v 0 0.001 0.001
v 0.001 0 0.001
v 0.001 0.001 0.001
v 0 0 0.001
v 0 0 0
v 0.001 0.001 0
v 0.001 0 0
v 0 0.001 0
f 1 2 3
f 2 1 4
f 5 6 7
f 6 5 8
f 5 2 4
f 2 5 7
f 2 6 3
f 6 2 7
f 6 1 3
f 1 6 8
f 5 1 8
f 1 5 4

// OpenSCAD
// t_mesh — mesh properties WITHOUT rendering. This is the tier that catches the
// silent-material-loss class; CGAL's "Simple: yes" does not (docs/developer/verification.md).

use <../src/uniTube.scad>;

$fa = 6;
$fs = 0.5;

path = ut_polyline([[0, 0, 0], [50, 0, 0], [50, 50, 0]], r=15);
prof = ut_round(od=12, wall=2);
N = len(ut_prof_outer(prof));

// Analytic expectation: the swept area is the annulus between two N-gons, and
// the developed length is exact. Faceting the arc makes the mesh slightly
// smaller than the ideal, hence the band rather than an equality.
poly_area = function(r) (N / 2) * r * r * sin(360 / N);
expected = (poly_area(6) - poly_area(4)) * ut_length(path);
vol = ut_run_volume(path, prof);
assert(
    abs(vol - expected) / expected < 0.005,
    str("mesh volume ", vol, " must be within 0.5% of the analytic ", expected)
);

// The bore is a POSITIVE solid built from the same spine, stations and frame.
// That is what makes the junction two-pass free (AGENTS.md rule 5).
bore = ut_run_volume(path, prof, "bore");
shell = ut_run_volume(path, prof, "shell");
assert(abs(shell - bore - vol) / vol < 1e-6, "shell - bore must equal the finished wall exactly");
assert(abs(bore - poly_area(4) * ut_length(path)) / bore < 0.005, "bore volume matches the analytic lumen");

// Face and vertex counts are structural, not approximate.
sts = ut_stations(path);
pts = ut_mesh_points(ut_solid_rgn(prof), sts);
fcs = ut_mesh_faces(ut_solid_rgn(prof), sts);
assert(len(pts) == len(sts) * 2 * N, "annular mesh has 2N vertices per station");
assert(len(fcs) == (len(sts) - 1) * 4 * N + 4 * N, "annular mesh face count: skins plus two ring caps");
assert(
    min([for (f = fcs) len(f)]) == 3 && max([for (f = fcs) len(f)]) == 3,
    "every face is a TRIANGLE -- swept quads are non-planar and OpenSCAD would guess"
);

// Every vertex index is in range: an out-of-range index is a silent bad mesh.
assert(max([for (f = fcs) max(f)]) == len(pts) - 1, "face indices reach exactly the last vertex");
assert(min([for (f = fcs) min(f)]) == 0, "face indices start at 0");

// WINDING. ut_mesh_faces() is counter-clockwise seen from outside, so ut_volume()
// is positive; polyhedron() wants clockwise, and ut_sweep() converts with
// _ut_cw() at the one place the mesh is emitted. Passing the faces through
// unconverted made every swept solid inside-out, which no gate on 2021.01 could
// see: CGAL repairs orientation in a boolean. `just check` measures the sign of
// the EXPORTED mesh, which is the half this file cannot.
assert(ut_volume(pts, fcs) > 0, "ut_mesh_faces winds counter-clockwise from outside: positive volume");
assert(
    abs(ut_volume(pts, _ut_cw(fcs)) + ut_volume(pts, fcs)) < 1e-9,
    "_ut_cw reverses every face, so the volume changes sign exactly"
);
assert(len(_ut_cw(fcs)) == len(fcs), "and it drops none");

cube(0.001); // sentinel
